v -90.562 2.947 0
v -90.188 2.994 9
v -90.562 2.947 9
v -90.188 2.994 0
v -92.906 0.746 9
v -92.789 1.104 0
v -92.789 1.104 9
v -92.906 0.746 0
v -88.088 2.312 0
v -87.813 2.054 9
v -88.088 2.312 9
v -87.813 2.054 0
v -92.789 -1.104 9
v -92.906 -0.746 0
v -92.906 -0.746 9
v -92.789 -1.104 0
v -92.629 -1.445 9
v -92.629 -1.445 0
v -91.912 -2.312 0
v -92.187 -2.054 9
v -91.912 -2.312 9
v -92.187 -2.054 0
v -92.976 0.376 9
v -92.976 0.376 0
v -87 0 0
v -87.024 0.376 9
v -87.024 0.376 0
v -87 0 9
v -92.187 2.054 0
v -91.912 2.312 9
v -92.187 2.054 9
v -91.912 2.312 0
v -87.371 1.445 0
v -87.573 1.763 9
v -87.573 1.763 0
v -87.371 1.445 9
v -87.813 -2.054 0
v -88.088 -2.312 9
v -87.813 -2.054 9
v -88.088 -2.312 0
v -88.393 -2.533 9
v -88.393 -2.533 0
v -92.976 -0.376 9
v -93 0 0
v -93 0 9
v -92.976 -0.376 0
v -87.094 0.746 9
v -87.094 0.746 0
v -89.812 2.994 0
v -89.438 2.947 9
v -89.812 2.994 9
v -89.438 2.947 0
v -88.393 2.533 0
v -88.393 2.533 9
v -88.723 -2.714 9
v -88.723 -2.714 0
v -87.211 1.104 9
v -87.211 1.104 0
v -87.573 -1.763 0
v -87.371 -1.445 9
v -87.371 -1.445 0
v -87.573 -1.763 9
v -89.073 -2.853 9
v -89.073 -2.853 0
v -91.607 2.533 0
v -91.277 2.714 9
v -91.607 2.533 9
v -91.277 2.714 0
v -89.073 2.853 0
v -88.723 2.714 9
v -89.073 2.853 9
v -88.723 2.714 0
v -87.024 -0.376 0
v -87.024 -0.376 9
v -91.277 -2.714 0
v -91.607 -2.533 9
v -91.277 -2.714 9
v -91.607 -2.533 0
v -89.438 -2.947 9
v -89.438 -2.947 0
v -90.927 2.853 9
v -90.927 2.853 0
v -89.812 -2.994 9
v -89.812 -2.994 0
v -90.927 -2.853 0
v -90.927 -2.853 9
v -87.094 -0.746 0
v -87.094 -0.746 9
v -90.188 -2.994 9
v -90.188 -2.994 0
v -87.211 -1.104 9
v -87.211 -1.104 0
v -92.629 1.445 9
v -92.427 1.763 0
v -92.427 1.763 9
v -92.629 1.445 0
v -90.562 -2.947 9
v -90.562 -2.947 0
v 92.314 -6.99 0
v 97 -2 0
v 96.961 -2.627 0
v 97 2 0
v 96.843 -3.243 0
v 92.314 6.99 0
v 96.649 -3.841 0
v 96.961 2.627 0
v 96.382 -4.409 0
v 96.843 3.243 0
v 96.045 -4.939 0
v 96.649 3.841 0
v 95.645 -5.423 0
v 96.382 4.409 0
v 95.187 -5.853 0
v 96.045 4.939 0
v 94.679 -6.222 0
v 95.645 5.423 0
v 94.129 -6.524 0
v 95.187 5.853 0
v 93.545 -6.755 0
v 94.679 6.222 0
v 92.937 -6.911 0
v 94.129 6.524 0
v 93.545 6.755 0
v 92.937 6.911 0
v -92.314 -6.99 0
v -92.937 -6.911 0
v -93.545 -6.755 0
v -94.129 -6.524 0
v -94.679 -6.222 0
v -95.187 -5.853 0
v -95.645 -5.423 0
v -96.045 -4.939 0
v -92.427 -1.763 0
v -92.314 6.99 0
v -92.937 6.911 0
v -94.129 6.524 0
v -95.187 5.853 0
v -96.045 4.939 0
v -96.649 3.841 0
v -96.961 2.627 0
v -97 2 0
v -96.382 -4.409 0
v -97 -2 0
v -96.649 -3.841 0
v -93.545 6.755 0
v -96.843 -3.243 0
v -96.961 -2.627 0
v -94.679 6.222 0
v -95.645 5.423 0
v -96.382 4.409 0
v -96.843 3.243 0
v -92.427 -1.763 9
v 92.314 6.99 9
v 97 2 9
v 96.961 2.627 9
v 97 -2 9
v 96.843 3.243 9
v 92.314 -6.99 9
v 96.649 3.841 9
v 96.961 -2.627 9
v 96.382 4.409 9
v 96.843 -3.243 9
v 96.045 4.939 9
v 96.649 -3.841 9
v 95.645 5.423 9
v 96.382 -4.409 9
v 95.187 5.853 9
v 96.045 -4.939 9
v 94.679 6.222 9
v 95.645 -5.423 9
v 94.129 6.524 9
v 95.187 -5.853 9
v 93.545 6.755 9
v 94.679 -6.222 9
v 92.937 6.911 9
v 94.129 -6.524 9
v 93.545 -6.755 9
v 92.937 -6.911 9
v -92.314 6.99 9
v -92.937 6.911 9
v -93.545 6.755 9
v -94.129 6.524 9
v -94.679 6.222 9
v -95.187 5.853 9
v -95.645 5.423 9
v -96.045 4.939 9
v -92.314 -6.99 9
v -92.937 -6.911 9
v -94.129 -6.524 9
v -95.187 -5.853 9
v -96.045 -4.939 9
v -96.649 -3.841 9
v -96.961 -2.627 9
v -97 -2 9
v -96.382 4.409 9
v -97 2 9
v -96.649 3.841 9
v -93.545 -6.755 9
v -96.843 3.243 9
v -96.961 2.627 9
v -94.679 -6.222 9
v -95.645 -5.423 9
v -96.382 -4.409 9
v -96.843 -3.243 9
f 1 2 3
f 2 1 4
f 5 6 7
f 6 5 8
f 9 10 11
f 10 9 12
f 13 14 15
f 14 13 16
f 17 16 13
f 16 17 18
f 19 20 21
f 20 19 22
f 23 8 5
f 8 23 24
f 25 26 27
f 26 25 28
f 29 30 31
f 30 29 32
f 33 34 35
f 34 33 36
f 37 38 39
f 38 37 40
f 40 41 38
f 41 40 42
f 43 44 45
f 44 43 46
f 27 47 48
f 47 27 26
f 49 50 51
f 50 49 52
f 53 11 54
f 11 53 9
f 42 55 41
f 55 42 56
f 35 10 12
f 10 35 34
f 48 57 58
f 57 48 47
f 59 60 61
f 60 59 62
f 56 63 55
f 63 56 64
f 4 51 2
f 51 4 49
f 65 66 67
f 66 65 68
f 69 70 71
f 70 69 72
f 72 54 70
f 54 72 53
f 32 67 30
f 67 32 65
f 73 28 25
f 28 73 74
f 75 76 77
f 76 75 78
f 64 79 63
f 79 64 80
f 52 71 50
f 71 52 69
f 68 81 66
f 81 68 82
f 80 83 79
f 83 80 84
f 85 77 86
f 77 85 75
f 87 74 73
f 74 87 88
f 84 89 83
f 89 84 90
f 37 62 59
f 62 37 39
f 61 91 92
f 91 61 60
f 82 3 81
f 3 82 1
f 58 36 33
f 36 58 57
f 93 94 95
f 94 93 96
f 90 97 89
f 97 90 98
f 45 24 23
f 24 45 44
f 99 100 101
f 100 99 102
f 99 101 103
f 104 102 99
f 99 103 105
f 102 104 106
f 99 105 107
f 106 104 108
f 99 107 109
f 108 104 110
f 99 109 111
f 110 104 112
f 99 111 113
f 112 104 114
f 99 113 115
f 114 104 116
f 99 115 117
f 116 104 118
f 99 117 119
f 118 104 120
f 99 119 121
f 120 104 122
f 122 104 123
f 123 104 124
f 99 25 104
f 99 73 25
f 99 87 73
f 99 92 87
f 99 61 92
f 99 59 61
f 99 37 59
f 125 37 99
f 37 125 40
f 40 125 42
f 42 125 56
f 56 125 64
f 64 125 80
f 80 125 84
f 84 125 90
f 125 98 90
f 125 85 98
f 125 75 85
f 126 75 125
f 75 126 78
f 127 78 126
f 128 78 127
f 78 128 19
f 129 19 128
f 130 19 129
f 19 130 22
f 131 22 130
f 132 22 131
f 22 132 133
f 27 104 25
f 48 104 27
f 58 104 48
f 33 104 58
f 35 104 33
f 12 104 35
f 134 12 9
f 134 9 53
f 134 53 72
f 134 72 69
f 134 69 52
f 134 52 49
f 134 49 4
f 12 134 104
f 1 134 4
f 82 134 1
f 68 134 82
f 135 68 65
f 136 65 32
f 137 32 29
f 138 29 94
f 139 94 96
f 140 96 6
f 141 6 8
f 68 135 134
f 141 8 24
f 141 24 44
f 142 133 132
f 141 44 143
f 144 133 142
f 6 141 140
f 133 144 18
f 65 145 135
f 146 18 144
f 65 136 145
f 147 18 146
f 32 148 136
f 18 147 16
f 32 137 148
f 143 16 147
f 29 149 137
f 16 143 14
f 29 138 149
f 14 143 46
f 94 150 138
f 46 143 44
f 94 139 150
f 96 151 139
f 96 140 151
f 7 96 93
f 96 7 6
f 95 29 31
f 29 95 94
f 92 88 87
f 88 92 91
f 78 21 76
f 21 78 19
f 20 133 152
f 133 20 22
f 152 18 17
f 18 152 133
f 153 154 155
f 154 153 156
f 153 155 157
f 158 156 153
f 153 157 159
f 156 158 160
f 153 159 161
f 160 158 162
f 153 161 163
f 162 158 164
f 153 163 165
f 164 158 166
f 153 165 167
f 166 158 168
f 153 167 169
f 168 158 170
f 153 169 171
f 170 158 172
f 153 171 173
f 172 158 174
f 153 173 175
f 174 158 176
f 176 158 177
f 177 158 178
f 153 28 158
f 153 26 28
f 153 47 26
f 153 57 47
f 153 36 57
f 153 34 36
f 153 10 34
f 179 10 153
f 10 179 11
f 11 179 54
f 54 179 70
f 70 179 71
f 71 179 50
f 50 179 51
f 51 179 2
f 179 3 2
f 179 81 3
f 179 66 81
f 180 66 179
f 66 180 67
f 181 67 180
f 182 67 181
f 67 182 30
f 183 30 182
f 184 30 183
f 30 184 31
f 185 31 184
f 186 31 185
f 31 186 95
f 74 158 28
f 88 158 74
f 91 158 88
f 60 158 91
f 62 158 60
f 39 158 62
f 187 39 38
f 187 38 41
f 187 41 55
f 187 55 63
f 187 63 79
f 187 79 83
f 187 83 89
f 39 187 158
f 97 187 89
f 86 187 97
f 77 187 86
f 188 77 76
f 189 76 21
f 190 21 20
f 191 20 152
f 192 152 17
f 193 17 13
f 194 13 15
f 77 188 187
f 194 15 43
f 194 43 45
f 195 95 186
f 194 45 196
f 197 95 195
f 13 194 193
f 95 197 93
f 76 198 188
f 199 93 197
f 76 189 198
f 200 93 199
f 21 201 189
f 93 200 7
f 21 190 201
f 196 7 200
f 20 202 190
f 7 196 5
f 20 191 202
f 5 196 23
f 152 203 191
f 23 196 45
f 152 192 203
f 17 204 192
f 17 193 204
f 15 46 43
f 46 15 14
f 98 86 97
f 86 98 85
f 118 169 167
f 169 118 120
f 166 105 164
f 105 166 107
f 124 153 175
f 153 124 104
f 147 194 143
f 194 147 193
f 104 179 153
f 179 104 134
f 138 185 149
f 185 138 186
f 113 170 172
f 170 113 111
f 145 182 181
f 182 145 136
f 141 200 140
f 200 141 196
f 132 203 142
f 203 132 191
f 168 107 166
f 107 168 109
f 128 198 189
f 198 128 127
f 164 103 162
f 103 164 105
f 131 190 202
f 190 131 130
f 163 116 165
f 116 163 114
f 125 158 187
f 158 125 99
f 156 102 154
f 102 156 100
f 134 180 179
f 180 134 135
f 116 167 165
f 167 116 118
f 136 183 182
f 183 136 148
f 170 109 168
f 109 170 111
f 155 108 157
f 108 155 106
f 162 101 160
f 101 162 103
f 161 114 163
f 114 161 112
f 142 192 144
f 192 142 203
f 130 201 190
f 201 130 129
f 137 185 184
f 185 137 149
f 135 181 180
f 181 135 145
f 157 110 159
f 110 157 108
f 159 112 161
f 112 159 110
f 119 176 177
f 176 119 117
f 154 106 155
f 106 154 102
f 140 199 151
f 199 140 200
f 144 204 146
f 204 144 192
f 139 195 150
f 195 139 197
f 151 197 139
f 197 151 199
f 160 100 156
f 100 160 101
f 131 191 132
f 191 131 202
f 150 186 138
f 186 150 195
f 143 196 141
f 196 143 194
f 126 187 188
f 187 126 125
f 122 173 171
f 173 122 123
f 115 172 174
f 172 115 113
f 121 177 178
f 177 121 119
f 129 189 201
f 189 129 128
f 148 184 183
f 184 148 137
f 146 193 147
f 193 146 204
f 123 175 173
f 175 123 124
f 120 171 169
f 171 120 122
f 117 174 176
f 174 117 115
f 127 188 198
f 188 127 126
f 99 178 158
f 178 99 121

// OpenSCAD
$fn = 50;


difference() {
	union() {
		hull() {
			translate(v = [-92.0000000000, 2.0000000000, 0]) {
				cylinder(h = 9, r = 5);
			}
			translate(v = [92.0000000000, 2.0000000000, 0]) {
				cylinder(h = 9, r = 5);
			}
			translate(v = [-92.0000000000, -2.0000000000, 0]) {
				cylinder(h = 9, r = 5);
			}
			translate(v = [92.0000000000, -2.0000000000, 0]) {
				cylinder(h = 9, r = 5);
			}
		}
	}
	union() {
		translate(v = [-90.0000000000, 0.0000000000, 0]) {
			cylinder(h = 9, r = 3.0000000000);
		}
		translate(v = [-90.0000000000, 0.0000000000, 0]) {
			cylinder(h = 9, r = 1.5000000000);
		}
		translate(v = [-90.0000000000, 0.0000000000, 0]) {
			cylinder(h = 9, r = 1.5000000000);
		}
		translate(v = [-90.0000000000, 0.0000000000, 0]) {
			cylinder(h = 9, r = 1.5000000000);
		}
	}
}
